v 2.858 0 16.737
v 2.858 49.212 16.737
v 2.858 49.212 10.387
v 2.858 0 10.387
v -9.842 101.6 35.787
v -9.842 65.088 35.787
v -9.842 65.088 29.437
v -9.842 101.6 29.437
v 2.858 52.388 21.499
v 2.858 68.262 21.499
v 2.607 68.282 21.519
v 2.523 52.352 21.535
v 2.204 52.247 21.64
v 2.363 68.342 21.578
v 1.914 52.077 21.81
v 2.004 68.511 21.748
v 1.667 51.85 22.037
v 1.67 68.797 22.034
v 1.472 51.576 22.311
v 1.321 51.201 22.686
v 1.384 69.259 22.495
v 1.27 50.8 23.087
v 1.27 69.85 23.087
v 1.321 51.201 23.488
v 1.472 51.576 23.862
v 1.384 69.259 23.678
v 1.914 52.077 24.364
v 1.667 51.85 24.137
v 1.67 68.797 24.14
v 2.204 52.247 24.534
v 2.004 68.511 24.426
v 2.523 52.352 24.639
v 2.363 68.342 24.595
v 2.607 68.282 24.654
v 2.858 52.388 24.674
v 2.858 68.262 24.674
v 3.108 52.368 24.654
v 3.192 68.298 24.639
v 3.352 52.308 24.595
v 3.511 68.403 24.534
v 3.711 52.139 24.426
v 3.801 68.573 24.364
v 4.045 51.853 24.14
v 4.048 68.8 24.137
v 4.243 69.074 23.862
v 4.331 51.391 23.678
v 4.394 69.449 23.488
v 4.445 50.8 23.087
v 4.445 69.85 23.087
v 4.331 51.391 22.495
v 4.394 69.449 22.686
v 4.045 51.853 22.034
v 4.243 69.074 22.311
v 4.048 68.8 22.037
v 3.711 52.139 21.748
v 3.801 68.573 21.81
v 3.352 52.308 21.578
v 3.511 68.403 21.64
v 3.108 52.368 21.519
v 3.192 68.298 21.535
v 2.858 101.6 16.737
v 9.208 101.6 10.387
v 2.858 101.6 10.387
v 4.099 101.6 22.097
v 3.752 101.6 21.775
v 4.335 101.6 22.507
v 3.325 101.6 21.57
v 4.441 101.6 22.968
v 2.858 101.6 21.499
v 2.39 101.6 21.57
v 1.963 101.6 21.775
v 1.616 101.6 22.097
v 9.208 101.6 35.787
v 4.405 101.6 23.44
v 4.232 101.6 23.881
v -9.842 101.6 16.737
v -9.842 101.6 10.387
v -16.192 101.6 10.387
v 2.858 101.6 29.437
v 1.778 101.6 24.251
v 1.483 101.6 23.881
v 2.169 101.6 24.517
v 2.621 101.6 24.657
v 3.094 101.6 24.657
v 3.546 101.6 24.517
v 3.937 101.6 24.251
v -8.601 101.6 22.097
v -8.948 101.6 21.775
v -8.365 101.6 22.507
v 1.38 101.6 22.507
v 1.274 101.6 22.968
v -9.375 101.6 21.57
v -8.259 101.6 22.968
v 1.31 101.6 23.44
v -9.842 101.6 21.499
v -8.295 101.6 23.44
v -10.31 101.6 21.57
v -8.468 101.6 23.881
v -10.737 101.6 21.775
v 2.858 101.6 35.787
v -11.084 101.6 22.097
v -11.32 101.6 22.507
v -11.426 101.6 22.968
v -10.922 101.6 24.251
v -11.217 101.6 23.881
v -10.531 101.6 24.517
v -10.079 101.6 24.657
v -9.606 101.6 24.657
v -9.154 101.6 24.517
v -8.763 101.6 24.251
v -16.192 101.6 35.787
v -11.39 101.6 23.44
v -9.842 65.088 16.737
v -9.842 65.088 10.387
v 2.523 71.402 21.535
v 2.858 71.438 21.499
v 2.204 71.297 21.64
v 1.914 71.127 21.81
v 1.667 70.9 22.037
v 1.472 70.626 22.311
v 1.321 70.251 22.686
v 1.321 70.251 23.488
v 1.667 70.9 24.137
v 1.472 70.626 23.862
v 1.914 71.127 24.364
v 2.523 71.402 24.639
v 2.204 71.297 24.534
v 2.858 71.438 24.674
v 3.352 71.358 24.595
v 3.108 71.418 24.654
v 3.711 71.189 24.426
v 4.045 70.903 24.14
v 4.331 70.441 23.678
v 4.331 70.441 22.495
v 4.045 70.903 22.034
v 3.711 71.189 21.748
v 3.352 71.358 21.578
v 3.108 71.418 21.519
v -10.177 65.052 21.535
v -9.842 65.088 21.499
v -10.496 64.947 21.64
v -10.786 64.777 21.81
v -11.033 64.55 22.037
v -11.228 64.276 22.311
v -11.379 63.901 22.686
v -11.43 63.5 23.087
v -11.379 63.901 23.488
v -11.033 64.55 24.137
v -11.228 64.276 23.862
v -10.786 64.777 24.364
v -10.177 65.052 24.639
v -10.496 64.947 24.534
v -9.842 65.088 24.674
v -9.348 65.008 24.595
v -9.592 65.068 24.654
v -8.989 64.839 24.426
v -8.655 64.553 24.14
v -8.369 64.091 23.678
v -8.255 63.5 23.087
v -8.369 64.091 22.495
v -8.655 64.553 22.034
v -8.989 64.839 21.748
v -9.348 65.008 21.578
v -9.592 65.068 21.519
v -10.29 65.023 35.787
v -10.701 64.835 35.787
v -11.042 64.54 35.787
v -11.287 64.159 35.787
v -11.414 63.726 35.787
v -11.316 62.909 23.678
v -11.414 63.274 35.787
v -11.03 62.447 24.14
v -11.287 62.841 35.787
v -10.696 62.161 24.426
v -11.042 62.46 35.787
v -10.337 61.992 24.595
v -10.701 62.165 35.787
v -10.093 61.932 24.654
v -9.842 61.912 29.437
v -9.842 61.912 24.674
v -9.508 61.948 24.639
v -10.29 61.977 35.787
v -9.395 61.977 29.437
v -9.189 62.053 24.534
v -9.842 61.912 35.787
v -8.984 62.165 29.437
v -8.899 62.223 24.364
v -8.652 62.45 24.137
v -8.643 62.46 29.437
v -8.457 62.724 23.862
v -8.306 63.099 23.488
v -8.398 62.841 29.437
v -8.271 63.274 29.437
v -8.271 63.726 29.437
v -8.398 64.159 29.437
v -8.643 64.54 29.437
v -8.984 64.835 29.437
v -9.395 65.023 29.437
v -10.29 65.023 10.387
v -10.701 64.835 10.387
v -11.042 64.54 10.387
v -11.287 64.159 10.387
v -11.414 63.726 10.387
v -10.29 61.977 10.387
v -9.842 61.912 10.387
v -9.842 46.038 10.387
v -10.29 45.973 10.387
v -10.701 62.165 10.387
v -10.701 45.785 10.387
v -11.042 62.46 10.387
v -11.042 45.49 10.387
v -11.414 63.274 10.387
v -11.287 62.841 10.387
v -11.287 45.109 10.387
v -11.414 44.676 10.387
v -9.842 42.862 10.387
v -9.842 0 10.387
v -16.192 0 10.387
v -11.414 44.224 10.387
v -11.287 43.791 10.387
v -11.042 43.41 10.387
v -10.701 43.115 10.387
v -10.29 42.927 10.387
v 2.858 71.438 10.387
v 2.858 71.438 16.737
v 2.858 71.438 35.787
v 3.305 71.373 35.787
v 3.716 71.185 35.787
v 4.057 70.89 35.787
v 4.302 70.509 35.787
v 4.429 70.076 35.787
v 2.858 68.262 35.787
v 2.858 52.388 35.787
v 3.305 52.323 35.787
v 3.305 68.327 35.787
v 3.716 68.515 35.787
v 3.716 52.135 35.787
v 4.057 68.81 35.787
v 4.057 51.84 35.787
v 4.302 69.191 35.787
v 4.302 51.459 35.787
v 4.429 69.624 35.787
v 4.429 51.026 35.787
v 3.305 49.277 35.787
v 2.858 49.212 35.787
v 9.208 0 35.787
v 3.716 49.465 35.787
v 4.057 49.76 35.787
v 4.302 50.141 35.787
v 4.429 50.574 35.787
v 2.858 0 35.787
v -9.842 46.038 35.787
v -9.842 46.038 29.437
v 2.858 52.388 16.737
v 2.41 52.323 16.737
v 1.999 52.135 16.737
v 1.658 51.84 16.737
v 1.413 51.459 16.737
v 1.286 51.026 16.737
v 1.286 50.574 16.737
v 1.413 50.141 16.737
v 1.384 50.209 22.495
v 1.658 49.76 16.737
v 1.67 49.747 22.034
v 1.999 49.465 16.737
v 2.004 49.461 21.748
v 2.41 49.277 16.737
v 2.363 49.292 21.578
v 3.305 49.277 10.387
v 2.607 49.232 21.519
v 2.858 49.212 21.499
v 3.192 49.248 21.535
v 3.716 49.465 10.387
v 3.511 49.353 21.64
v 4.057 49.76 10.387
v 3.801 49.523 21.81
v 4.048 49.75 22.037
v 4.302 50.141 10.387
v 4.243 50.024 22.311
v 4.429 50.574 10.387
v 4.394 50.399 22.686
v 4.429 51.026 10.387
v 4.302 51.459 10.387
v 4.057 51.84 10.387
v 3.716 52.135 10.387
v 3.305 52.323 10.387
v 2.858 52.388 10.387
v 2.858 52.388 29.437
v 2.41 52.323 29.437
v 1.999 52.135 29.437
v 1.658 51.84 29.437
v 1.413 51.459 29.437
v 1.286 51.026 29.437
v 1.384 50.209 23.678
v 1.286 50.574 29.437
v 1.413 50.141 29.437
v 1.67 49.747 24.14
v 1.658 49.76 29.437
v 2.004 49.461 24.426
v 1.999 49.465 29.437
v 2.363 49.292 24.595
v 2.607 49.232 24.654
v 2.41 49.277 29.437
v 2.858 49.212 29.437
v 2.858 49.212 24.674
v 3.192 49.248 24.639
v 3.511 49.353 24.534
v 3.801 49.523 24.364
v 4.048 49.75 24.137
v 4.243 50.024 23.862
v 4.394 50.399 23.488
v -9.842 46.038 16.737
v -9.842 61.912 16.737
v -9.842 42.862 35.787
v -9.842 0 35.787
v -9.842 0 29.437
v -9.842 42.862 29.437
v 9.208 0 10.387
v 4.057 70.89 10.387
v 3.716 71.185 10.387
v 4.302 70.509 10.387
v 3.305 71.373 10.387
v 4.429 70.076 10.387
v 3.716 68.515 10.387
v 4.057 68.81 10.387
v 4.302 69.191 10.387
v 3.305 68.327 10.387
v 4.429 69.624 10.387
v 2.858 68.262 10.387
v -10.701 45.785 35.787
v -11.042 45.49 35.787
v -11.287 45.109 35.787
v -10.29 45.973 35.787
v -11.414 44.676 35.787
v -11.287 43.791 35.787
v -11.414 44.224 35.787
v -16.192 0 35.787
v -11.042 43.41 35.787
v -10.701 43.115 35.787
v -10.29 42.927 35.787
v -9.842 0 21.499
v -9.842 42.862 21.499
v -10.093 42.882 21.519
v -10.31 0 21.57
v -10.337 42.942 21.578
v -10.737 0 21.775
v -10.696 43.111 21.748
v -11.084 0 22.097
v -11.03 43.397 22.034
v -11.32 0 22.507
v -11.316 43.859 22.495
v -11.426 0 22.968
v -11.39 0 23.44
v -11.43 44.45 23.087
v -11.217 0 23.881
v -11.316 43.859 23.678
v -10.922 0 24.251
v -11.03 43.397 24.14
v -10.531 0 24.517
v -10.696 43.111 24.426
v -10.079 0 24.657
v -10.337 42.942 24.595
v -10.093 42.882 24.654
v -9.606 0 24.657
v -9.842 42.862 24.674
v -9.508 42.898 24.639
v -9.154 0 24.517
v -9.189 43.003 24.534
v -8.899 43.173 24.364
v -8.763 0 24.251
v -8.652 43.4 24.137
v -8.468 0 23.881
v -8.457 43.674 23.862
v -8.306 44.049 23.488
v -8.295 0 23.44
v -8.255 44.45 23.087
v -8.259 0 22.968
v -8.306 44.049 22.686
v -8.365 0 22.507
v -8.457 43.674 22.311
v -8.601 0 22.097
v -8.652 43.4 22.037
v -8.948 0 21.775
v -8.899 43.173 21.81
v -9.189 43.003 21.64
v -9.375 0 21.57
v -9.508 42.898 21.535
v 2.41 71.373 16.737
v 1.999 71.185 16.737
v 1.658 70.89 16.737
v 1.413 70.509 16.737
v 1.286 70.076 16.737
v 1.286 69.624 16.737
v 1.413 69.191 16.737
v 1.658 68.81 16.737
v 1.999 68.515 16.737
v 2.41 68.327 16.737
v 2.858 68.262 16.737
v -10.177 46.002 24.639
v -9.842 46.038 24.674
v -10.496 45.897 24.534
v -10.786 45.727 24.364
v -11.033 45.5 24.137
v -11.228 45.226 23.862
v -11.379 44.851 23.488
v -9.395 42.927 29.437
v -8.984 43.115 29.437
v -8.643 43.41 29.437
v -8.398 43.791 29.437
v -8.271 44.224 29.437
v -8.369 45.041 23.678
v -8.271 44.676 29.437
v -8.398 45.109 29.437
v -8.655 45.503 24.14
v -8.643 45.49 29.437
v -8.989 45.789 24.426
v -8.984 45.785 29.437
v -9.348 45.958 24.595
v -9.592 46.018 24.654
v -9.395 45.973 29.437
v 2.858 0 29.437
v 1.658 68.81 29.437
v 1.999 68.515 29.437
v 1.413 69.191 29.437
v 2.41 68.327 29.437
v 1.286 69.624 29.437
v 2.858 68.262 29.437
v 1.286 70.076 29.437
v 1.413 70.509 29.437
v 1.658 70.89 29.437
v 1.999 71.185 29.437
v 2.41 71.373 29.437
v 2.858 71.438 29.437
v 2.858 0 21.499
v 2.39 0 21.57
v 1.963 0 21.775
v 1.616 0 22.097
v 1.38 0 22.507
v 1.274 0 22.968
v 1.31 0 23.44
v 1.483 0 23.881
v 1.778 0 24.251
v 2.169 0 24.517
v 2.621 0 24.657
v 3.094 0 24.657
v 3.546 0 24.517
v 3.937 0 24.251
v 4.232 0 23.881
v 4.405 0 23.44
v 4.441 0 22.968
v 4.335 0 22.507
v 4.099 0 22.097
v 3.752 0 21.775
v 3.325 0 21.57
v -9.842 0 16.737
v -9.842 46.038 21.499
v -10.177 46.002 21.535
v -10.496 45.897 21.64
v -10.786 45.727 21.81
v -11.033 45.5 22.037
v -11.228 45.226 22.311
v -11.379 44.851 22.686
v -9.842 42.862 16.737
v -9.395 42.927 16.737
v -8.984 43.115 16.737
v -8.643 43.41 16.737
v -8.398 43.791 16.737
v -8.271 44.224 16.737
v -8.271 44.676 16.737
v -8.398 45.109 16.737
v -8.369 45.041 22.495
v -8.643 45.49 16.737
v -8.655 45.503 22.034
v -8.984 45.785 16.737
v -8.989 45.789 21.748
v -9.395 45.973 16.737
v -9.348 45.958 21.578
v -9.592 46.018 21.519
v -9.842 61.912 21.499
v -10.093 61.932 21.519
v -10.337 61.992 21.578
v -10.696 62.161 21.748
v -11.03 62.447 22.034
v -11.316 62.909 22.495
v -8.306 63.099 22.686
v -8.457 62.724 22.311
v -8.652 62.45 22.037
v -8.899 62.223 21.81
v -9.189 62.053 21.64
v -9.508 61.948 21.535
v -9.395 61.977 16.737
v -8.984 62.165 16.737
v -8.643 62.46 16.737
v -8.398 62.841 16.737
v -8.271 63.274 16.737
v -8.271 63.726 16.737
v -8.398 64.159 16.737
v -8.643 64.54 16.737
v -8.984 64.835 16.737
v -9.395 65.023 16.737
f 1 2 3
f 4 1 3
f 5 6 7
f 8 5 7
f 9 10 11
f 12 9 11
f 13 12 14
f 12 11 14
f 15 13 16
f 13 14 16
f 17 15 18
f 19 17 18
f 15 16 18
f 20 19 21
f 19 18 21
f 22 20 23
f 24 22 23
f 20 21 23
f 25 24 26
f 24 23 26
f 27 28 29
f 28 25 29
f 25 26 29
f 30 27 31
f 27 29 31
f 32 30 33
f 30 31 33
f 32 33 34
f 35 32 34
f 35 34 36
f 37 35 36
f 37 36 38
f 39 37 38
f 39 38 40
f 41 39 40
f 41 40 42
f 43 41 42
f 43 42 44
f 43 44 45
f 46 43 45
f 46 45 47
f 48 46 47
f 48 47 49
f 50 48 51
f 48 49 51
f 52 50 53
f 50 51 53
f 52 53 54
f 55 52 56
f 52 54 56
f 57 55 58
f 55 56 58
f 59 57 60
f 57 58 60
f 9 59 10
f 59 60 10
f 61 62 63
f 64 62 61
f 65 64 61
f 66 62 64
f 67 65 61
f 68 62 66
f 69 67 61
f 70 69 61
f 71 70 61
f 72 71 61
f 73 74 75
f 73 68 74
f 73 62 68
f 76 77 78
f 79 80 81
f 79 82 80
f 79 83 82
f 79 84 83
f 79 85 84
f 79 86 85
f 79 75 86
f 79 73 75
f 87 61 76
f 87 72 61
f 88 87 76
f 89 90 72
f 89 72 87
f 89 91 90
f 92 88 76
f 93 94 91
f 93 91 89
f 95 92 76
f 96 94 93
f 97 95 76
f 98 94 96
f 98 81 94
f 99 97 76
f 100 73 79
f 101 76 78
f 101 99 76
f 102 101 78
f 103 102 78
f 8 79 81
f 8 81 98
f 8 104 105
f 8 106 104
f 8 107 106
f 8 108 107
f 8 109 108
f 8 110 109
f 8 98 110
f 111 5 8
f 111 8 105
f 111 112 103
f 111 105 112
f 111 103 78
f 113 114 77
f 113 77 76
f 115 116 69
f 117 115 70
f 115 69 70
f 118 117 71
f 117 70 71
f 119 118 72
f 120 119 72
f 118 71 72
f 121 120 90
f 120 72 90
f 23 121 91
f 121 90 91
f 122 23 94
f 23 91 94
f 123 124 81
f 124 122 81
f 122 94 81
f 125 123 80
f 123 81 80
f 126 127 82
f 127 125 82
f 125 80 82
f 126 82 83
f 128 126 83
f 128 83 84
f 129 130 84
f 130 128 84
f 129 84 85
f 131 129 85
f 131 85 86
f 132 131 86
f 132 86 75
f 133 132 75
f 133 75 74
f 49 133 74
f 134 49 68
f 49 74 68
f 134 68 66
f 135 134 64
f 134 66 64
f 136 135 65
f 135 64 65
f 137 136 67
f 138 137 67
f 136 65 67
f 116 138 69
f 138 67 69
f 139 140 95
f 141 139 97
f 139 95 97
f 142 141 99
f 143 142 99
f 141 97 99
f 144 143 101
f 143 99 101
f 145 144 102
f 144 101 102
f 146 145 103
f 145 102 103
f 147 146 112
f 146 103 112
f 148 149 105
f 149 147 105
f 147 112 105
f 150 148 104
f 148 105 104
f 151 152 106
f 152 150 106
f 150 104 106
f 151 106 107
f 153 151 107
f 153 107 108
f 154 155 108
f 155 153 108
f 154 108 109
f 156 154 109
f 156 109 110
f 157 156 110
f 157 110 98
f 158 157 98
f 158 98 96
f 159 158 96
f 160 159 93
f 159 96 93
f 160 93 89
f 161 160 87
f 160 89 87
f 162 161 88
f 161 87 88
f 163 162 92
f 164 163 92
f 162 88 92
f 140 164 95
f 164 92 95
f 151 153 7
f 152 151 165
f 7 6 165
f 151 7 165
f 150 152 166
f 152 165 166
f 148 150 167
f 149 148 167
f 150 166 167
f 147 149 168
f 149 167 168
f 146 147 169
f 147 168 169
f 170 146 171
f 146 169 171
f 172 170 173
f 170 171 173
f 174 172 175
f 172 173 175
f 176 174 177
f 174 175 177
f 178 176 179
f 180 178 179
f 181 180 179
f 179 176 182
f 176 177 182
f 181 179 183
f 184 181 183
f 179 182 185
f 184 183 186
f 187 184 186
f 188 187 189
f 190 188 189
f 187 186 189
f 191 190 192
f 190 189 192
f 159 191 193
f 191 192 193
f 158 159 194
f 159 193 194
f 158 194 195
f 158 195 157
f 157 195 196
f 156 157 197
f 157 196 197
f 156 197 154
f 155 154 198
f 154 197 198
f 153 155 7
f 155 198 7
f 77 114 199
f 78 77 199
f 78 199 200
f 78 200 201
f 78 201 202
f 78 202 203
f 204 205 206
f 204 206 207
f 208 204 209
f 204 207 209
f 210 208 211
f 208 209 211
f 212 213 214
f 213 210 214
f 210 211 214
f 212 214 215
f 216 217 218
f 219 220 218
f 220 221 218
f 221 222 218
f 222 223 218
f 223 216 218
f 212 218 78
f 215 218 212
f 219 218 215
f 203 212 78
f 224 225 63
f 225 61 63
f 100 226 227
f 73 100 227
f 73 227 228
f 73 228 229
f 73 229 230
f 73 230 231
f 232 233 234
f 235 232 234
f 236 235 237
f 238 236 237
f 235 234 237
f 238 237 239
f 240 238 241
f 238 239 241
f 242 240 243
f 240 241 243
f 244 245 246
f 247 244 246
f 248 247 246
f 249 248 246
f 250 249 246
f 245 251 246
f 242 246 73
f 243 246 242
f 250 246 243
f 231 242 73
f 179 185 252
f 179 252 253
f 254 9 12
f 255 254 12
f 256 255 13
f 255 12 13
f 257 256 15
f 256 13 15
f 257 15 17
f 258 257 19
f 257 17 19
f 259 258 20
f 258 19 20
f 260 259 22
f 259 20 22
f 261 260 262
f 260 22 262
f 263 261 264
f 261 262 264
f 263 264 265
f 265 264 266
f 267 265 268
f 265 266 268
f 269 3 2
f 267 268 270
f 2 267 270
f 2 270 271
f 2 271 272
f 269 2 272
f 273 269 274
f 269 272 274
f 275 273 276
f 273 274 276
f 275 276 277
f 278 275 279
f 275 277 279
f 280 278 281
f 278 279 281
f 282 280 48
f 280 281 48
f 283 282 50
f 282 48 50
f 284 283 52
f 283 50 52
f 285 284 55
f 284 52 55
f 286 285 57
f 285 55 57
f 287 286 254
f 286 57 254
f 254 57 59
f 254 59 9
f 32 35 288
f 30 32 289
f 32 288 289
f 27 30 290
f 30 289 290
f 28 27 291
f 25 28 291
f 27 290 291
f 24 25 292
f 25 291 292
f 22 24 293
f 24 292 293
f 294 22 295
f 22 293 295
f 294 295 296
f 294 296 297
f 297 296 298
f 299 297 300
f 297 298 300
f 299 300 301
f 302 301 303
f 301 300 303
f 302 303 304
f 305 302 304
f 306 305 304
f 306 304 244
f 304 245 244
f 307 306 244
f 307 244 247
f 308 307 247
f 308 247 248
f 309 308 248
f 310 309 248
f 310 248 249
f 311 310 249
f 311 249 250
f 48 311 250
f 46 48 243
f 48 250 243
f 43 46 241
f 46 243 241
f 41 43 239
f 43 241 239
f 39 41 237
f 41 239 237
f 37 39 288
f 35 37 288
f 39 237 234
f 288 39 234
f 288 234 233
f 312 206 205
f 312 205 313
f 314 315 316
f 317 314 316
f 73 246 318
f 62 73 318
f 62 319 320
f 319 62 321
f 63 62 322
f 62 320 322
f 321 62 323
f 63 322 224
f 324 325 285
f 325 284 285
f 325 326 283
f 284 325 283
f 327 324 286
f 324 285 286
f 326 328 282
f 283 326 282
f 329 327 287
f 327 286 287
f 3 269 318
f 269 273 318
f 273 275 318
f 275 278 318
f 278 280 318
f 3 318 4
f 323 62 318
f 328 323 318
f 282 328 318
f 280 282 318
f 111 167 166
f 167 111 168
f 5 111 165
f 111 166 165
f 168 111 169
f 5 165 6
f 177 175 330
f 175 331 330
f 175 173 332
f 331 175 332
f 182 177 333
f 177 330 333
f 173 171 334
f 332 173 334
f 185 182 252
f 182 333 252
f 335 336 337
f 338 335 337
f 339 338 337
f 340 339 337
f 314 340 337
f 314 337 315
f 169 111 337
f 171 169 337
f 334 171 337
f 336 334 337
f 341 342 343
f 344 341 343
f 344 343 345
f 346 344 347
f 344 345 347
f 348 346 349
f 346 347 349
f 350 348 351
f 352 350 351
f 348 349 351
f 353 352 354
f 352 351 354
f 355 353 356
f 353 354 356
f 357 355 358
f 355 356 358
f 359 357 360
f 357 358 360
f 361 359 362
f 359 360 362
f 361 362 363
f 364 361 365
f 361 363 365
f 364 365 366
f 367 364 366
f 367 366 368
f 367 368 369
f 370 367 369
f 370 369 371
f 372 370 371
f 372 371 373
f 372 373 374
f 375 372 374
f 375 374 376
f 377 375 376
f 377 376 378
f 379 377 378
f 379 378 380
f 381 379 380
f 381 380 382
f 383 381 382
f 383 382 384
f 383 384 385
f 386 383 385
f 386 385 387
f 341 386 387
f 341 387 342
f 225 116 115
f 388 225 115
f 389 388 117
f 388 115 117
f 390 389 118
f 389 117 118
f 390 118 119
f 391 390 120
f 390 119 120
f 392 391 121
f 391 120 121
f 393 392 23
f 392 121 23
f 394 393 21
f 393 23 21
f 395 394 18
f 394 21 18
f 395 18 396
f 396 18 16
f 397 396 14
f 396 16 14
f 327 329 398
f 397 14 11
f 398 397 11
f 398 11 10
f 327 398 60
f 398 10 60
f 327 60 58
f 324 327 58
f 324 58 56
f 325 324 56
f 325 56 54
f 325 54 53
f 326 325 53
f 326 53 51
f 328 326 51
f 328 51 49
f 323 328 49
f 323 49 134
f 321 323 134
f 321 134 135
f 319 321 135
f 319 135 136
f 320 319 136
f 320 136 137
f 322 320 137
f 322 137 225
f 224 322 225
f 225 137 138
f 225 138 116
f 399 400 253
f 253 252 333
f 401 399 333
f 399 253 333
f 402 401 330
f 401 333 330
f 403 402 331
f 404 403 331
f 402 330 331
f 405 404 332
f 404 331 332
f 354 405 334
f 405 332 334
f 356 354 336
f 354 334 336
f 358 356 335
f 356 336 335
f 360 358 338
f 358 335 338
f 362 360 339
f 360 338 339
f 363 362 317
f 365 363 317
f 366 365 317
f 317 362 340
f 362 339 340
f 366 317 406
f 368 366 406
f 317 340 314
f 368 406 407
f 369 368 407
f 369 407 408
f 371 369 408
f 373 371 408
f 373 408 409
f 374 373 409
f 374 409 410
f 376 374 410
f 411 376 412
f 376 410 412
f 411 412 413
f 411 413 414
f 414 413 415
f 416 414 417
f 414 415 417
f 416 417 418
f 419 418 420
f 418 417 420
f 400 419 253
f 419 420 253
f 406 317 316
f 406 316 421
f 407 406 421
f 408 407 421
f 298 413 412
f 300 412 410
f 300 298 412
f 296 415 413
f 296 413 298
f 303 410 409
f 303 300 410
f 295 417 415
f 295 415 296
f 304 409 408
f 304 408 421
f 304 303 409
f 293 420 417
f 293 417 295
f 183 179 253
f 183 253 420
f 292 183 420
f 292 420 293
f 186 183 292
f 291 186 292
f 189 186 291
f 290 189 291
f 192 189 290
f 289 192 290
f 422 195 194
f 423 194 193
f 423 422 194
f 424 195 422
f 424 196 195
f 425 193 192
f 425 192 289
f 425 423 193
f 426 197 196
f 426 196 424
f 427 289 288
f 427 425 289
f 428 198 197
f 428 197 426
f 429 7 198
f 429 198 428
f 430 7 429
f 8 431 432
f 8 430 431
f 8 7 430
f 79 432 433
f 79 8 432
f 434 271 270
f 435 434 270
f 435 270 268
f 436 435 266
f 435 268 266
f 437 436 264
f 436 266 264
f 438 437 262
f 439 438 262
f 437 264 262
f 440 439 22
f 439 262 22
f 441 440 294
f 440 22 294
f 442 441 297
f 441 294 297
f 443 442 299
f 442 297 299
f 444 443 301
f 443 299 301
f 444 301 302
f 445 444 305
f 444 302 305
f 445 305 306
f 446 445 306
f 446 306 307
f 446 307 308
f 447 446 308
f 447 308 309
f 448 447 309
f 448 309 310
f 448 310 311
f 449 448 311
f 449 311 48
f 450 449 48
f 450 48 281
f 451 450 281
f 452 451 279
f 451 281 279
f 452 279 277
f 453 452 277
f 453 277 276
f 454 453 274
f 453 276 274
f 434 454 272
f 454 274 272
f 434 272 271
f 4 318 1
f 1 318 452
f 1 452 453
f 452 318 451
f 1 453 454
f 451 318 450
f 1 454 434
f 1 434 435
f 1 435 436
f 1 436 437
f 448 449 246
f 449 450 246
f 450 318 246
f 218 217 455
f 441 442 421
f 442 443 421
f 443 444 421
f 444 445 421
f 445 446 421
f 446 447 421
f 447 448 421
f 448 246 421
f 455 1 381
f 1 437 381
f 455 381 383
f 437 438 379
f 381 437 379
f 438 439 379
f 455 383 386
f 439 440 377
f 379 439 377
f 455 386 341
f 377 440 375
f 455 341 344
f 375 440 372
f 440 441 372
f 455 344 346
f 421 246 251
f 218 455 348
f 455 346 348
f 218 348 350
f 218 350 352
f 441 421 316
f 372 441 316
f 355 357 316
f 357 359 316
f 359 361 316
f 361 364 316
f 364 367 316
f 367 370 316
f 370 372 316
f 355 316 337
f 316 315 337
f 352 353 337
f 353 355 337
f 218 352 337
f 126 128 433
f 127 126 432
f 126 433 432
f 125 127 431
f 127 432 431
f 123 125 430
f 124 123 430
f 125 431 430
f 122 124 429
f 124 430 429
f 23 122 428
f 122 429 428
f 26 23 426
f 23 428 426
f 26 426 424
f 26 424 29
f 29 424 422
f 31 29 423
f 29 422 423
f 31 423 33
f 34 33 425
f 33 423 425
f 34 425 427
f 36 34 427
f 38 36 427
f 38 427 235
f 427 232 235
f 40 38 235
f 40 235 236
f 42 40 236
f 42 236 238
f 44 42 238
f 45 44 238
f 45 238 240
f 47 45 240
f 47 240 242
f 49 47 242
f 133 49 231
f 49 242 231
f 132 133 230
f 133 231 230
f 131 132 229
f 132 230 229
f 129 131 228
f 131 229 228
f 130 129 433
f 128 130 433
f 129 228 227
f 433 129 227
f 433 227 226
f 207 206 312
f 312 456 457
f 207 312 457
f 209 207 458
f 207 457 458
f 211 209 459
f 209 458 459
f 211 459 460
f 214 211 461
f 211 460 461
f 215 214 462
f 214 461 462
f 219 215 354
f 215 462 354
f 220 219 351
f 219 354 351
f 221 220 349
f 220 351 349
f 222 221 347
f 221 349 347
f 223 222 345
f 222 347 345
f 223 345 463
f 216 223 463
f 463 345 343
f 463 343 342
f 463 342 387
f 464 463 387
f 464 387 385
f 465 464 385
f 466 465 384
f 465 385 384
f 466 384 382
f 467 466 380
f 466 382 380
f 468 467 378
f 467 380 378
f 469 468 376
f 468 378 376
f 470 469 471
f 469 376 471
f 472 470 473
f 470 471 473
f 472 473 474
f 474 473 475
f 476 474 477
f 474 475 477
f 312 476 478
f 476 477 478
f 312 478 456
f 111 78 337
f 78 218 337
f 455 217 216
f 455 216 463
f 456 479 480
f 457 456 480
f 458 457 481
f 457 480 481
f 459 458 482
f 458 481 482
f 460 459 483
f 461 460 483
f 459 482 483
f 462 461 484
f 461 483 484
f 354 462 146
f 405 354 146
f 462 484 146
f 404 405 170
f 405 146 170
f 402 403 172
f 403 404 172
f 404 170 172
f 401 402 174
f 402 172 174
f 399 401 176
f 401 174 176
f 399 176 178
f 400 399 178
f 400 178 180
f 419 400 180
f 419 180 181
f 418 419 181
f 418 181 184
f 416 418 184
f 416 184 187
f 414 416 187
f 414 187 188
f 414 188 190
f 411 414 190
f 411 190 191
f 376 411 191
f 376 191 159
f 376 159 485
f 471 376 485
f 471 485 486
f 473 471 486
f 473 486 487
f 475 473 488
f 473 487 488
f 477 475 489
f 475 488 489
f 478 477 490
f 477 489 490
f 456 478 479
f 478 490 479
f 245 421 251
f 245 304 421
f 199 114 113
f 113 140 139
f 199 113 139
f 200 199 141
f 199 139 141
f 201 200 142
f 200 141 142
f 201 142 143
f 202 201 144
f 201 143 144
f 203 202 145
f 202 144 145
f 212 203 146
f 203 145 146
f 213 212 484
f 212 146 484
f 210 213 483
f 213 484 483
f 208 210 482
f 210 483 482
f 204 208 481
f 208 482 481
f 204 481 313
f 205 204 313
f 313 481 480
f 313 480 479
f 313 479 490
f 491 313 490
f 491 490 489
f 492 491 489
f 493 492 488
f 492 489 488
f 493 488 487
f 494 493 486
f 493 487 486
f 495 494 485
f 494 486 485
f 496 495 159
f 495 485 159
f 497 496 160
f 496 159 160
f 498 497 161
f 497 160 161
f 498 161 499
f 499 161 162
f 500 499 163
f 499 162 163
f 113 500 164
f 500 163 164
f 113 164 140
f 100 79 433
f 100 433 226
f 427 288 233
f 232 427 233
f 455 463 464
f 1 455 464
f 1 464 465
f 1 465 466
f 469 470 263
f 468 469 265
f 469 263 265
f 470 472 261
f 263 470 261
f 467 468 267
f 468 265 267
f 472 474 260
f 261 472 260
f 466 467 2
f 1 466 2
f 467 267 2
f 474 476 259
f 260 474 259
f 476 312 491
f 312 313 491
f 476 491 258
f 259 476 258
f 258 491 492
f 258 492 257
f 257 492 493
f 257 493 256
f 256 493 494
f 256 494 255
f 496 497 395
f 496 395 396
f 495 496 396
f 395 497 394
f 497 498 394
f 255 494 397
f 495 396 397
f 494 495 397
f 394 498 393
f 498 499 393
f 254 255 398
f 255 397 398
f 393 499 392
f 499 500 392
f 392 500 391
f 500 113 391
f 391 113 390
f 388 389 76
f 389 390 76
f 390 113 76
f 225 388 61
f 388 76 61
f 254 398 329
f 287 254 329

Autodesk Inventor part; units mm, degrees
ref_plane "YZ Plane" through (0, 0, 0) normal (1, 0, 0) x (0, 1, 0)
ref_plane "XZ Plane" through (0, 0, 0) normal (0, 1, 0) x (-1, 0, 0)
ref_plane "XY Plane" through (0, 0, 0) normal (0, 0, 1) x (1, 0, 0)
sketch "Sketch1" plane through (0, 0, 0) normal (0, 1, 0) x (-1, 0, 0)
  line L0 (16.1925, 35.7868) -> (-9.2075, 35.7868)
  line L1 (-9.2075, 35.7868) -> (-9.2075, 10.3868)
  line L2 (-9.2075, 10.3868) -> (16.1925, 10.3868)
  line L3 (16.1925, 10.3868) -> (16.1925, 35.7868)
  point P0 (0, 0)
  dimension "d0" = 25.4
  dimension "d1" = 25.4
extrude "Extrusion1" add sketch "Sketch1" along normal blind 101.6
sketch "Sketch2" plane through (0, 101.6, 0) normal (0, 1, 0) x (1, 0, 0)
  line L0 (-9.8425, -16.7368) -> (2.8575, -16.7368)
  line L1 (2.8575, -16.7368) -> (2.8575, -1.003)
  line L2 (2.8575, -1.003) -> (-9.8425, -1.003)
  line L3 (-9.8425, -1.003) -> (-9.8425, -16.7368)
  line L4 (9.2075, -35.7868) -> (9.2075, -10.3868) projected
  line L5 (-16.1925, -10.3868) -> (-16.1925, -35.7868) projected
  line L6 (9.2075, -10.3868) -> (-16.1925, -10.3868) projected
  point P0 (0, 0)
  dimension "d4" = 6.35
  dimension "d5" = 6.35
  dimension "d6" = 6.35
extrude "Extrusion2" cut sketch "Sketch2" against normal blind 508
sketch "Sketch4" plane through (0, 101.6, 0) normal (0, 1, 0) x (1, 0, 0)
  line L0 (-9.8425, -29.4368) -> (2.8575, -29.4368)
  line L1 (2.8575, -29.4368) -> (2.8575, -45.8861)
  line L2 (2.8575, -45.8861) -> (-9.8425, -45.8861)
  line L3 (-9.8425, -45.8861) -> (-9.8425, -29.4368)
  line L4 (-16.1925, -10.3868) -> (-16.1925, -35.7868) projected
  line L5 (9.2075, -35.7868) -> (9.2075, -10.3868) projected
  line L6 (-16.1925, -35.7868) -> (9.2075, -35.7868) projected
  point P0 (0, 0)
  dimension "d20" = 6.35
  dimension "d21" = 6.35
  dimension "d22" = 6.35
extrude "Extrusion3" cut sketch "Sketch4" against normal blind 508
sketch "Sketch5" plane through (9.2075, 0, 10.3868) normal (0, 0, -1) x (-1, 0, 0)
  line L0 (0, 0) -> (6.35, 0) projected
  line L1 (0, 0) -> (0, 101.6) projected
  line L2 (25.4, 0) -> (25.4, 101.6) projected
  line L3 (19.05, 0) -> (25.4, 0) projected
  point P0 (9.2075, 0)
  point P1 (19.05, 44.45)
  point P2 (6.35, 50.8)
  dimension "d25" = 50.8
  dimension "d27" = 6.35
  dimension "d28" = 44.45
  dimension "d60" = 19.05
hole "Hole2" at (-9.8425, 44.45, 10.3868) at (2.8575, 50.8, 10.3868) direction (0, 0, 1) diameter 3.175 end through all
sketch "Sketch6" plane through (-16.1925, 0, 10.3868) normal (0, 0, -1) x (-1, 0, 0)
  line L0 (-6.35, 101.6) -> (-6.35, 46.0375) projected
  line L1 (-25.4, 101.6) -> (-19.05, 101.6) projected
  line L2 (-25.4, 0) -> (-25.4, 101.6) projected
  line L3 (-6.35, 101.6) -> (0, 101.6) projected
  line L4 (0, 0) -> (0, 101.6) projected
  arc A0 (-19.05, 49.2125) -> (-19.05, 52.3875) centre (-19.05, 50.8) ccw projected
  arc A1 (-6.35, 46.0375) -> (-6.35, 42.8625) centre (-6.35, 44.45) ccw projected
  point P0 (-16.1925, 0)
  point P1 (-19.05, 69.85)
  point P2 (-6.35, 63.5)
  dimension "d58" = 6.35
  dimension "d59" = 19.05
  dimension "d61" = 19.05
  dimension "d62" = 19.05
hole "Hole3" at (2.8575, 69.85, 10.3868) at (-9.8425, 63.5, 10.3868) direction (0, 0, 1) diameter 3.175 end through all
sketch "Sketch7" plane through (0, 0, 0) normal (0, -1, 0) x (1, 0, 0)
  line L0 (2.8575, 35.7868) -> (9.2075, 35.7868) projected
  line L1 (9.2075, 35.7868) -> (9.2075, 10.3868) projected
  line L2 (-16.1925, 10.3868) -> (-16.1925, 35.7868) projected
  line L3 (-16.1925, 35.7868) -> (-9.8425, 35.7868) projected
  point P0 (0, 0)
  point P1 (-9.8425, 23.0868)
  point P2 (2.8575, 23.0868)
  dimension "d47" = 12.7
  dimension "d48" = 6.35
  dimension "d49" = 6.35
  dimension "d50" = 12.7
hole "Hole4" at (-9.8425, 0, 23.0868) at (2.8575, 0, 23.0868) direction (0, 1, 0) diameter 3.175 end through all
properties part number "CarrierBeam"
